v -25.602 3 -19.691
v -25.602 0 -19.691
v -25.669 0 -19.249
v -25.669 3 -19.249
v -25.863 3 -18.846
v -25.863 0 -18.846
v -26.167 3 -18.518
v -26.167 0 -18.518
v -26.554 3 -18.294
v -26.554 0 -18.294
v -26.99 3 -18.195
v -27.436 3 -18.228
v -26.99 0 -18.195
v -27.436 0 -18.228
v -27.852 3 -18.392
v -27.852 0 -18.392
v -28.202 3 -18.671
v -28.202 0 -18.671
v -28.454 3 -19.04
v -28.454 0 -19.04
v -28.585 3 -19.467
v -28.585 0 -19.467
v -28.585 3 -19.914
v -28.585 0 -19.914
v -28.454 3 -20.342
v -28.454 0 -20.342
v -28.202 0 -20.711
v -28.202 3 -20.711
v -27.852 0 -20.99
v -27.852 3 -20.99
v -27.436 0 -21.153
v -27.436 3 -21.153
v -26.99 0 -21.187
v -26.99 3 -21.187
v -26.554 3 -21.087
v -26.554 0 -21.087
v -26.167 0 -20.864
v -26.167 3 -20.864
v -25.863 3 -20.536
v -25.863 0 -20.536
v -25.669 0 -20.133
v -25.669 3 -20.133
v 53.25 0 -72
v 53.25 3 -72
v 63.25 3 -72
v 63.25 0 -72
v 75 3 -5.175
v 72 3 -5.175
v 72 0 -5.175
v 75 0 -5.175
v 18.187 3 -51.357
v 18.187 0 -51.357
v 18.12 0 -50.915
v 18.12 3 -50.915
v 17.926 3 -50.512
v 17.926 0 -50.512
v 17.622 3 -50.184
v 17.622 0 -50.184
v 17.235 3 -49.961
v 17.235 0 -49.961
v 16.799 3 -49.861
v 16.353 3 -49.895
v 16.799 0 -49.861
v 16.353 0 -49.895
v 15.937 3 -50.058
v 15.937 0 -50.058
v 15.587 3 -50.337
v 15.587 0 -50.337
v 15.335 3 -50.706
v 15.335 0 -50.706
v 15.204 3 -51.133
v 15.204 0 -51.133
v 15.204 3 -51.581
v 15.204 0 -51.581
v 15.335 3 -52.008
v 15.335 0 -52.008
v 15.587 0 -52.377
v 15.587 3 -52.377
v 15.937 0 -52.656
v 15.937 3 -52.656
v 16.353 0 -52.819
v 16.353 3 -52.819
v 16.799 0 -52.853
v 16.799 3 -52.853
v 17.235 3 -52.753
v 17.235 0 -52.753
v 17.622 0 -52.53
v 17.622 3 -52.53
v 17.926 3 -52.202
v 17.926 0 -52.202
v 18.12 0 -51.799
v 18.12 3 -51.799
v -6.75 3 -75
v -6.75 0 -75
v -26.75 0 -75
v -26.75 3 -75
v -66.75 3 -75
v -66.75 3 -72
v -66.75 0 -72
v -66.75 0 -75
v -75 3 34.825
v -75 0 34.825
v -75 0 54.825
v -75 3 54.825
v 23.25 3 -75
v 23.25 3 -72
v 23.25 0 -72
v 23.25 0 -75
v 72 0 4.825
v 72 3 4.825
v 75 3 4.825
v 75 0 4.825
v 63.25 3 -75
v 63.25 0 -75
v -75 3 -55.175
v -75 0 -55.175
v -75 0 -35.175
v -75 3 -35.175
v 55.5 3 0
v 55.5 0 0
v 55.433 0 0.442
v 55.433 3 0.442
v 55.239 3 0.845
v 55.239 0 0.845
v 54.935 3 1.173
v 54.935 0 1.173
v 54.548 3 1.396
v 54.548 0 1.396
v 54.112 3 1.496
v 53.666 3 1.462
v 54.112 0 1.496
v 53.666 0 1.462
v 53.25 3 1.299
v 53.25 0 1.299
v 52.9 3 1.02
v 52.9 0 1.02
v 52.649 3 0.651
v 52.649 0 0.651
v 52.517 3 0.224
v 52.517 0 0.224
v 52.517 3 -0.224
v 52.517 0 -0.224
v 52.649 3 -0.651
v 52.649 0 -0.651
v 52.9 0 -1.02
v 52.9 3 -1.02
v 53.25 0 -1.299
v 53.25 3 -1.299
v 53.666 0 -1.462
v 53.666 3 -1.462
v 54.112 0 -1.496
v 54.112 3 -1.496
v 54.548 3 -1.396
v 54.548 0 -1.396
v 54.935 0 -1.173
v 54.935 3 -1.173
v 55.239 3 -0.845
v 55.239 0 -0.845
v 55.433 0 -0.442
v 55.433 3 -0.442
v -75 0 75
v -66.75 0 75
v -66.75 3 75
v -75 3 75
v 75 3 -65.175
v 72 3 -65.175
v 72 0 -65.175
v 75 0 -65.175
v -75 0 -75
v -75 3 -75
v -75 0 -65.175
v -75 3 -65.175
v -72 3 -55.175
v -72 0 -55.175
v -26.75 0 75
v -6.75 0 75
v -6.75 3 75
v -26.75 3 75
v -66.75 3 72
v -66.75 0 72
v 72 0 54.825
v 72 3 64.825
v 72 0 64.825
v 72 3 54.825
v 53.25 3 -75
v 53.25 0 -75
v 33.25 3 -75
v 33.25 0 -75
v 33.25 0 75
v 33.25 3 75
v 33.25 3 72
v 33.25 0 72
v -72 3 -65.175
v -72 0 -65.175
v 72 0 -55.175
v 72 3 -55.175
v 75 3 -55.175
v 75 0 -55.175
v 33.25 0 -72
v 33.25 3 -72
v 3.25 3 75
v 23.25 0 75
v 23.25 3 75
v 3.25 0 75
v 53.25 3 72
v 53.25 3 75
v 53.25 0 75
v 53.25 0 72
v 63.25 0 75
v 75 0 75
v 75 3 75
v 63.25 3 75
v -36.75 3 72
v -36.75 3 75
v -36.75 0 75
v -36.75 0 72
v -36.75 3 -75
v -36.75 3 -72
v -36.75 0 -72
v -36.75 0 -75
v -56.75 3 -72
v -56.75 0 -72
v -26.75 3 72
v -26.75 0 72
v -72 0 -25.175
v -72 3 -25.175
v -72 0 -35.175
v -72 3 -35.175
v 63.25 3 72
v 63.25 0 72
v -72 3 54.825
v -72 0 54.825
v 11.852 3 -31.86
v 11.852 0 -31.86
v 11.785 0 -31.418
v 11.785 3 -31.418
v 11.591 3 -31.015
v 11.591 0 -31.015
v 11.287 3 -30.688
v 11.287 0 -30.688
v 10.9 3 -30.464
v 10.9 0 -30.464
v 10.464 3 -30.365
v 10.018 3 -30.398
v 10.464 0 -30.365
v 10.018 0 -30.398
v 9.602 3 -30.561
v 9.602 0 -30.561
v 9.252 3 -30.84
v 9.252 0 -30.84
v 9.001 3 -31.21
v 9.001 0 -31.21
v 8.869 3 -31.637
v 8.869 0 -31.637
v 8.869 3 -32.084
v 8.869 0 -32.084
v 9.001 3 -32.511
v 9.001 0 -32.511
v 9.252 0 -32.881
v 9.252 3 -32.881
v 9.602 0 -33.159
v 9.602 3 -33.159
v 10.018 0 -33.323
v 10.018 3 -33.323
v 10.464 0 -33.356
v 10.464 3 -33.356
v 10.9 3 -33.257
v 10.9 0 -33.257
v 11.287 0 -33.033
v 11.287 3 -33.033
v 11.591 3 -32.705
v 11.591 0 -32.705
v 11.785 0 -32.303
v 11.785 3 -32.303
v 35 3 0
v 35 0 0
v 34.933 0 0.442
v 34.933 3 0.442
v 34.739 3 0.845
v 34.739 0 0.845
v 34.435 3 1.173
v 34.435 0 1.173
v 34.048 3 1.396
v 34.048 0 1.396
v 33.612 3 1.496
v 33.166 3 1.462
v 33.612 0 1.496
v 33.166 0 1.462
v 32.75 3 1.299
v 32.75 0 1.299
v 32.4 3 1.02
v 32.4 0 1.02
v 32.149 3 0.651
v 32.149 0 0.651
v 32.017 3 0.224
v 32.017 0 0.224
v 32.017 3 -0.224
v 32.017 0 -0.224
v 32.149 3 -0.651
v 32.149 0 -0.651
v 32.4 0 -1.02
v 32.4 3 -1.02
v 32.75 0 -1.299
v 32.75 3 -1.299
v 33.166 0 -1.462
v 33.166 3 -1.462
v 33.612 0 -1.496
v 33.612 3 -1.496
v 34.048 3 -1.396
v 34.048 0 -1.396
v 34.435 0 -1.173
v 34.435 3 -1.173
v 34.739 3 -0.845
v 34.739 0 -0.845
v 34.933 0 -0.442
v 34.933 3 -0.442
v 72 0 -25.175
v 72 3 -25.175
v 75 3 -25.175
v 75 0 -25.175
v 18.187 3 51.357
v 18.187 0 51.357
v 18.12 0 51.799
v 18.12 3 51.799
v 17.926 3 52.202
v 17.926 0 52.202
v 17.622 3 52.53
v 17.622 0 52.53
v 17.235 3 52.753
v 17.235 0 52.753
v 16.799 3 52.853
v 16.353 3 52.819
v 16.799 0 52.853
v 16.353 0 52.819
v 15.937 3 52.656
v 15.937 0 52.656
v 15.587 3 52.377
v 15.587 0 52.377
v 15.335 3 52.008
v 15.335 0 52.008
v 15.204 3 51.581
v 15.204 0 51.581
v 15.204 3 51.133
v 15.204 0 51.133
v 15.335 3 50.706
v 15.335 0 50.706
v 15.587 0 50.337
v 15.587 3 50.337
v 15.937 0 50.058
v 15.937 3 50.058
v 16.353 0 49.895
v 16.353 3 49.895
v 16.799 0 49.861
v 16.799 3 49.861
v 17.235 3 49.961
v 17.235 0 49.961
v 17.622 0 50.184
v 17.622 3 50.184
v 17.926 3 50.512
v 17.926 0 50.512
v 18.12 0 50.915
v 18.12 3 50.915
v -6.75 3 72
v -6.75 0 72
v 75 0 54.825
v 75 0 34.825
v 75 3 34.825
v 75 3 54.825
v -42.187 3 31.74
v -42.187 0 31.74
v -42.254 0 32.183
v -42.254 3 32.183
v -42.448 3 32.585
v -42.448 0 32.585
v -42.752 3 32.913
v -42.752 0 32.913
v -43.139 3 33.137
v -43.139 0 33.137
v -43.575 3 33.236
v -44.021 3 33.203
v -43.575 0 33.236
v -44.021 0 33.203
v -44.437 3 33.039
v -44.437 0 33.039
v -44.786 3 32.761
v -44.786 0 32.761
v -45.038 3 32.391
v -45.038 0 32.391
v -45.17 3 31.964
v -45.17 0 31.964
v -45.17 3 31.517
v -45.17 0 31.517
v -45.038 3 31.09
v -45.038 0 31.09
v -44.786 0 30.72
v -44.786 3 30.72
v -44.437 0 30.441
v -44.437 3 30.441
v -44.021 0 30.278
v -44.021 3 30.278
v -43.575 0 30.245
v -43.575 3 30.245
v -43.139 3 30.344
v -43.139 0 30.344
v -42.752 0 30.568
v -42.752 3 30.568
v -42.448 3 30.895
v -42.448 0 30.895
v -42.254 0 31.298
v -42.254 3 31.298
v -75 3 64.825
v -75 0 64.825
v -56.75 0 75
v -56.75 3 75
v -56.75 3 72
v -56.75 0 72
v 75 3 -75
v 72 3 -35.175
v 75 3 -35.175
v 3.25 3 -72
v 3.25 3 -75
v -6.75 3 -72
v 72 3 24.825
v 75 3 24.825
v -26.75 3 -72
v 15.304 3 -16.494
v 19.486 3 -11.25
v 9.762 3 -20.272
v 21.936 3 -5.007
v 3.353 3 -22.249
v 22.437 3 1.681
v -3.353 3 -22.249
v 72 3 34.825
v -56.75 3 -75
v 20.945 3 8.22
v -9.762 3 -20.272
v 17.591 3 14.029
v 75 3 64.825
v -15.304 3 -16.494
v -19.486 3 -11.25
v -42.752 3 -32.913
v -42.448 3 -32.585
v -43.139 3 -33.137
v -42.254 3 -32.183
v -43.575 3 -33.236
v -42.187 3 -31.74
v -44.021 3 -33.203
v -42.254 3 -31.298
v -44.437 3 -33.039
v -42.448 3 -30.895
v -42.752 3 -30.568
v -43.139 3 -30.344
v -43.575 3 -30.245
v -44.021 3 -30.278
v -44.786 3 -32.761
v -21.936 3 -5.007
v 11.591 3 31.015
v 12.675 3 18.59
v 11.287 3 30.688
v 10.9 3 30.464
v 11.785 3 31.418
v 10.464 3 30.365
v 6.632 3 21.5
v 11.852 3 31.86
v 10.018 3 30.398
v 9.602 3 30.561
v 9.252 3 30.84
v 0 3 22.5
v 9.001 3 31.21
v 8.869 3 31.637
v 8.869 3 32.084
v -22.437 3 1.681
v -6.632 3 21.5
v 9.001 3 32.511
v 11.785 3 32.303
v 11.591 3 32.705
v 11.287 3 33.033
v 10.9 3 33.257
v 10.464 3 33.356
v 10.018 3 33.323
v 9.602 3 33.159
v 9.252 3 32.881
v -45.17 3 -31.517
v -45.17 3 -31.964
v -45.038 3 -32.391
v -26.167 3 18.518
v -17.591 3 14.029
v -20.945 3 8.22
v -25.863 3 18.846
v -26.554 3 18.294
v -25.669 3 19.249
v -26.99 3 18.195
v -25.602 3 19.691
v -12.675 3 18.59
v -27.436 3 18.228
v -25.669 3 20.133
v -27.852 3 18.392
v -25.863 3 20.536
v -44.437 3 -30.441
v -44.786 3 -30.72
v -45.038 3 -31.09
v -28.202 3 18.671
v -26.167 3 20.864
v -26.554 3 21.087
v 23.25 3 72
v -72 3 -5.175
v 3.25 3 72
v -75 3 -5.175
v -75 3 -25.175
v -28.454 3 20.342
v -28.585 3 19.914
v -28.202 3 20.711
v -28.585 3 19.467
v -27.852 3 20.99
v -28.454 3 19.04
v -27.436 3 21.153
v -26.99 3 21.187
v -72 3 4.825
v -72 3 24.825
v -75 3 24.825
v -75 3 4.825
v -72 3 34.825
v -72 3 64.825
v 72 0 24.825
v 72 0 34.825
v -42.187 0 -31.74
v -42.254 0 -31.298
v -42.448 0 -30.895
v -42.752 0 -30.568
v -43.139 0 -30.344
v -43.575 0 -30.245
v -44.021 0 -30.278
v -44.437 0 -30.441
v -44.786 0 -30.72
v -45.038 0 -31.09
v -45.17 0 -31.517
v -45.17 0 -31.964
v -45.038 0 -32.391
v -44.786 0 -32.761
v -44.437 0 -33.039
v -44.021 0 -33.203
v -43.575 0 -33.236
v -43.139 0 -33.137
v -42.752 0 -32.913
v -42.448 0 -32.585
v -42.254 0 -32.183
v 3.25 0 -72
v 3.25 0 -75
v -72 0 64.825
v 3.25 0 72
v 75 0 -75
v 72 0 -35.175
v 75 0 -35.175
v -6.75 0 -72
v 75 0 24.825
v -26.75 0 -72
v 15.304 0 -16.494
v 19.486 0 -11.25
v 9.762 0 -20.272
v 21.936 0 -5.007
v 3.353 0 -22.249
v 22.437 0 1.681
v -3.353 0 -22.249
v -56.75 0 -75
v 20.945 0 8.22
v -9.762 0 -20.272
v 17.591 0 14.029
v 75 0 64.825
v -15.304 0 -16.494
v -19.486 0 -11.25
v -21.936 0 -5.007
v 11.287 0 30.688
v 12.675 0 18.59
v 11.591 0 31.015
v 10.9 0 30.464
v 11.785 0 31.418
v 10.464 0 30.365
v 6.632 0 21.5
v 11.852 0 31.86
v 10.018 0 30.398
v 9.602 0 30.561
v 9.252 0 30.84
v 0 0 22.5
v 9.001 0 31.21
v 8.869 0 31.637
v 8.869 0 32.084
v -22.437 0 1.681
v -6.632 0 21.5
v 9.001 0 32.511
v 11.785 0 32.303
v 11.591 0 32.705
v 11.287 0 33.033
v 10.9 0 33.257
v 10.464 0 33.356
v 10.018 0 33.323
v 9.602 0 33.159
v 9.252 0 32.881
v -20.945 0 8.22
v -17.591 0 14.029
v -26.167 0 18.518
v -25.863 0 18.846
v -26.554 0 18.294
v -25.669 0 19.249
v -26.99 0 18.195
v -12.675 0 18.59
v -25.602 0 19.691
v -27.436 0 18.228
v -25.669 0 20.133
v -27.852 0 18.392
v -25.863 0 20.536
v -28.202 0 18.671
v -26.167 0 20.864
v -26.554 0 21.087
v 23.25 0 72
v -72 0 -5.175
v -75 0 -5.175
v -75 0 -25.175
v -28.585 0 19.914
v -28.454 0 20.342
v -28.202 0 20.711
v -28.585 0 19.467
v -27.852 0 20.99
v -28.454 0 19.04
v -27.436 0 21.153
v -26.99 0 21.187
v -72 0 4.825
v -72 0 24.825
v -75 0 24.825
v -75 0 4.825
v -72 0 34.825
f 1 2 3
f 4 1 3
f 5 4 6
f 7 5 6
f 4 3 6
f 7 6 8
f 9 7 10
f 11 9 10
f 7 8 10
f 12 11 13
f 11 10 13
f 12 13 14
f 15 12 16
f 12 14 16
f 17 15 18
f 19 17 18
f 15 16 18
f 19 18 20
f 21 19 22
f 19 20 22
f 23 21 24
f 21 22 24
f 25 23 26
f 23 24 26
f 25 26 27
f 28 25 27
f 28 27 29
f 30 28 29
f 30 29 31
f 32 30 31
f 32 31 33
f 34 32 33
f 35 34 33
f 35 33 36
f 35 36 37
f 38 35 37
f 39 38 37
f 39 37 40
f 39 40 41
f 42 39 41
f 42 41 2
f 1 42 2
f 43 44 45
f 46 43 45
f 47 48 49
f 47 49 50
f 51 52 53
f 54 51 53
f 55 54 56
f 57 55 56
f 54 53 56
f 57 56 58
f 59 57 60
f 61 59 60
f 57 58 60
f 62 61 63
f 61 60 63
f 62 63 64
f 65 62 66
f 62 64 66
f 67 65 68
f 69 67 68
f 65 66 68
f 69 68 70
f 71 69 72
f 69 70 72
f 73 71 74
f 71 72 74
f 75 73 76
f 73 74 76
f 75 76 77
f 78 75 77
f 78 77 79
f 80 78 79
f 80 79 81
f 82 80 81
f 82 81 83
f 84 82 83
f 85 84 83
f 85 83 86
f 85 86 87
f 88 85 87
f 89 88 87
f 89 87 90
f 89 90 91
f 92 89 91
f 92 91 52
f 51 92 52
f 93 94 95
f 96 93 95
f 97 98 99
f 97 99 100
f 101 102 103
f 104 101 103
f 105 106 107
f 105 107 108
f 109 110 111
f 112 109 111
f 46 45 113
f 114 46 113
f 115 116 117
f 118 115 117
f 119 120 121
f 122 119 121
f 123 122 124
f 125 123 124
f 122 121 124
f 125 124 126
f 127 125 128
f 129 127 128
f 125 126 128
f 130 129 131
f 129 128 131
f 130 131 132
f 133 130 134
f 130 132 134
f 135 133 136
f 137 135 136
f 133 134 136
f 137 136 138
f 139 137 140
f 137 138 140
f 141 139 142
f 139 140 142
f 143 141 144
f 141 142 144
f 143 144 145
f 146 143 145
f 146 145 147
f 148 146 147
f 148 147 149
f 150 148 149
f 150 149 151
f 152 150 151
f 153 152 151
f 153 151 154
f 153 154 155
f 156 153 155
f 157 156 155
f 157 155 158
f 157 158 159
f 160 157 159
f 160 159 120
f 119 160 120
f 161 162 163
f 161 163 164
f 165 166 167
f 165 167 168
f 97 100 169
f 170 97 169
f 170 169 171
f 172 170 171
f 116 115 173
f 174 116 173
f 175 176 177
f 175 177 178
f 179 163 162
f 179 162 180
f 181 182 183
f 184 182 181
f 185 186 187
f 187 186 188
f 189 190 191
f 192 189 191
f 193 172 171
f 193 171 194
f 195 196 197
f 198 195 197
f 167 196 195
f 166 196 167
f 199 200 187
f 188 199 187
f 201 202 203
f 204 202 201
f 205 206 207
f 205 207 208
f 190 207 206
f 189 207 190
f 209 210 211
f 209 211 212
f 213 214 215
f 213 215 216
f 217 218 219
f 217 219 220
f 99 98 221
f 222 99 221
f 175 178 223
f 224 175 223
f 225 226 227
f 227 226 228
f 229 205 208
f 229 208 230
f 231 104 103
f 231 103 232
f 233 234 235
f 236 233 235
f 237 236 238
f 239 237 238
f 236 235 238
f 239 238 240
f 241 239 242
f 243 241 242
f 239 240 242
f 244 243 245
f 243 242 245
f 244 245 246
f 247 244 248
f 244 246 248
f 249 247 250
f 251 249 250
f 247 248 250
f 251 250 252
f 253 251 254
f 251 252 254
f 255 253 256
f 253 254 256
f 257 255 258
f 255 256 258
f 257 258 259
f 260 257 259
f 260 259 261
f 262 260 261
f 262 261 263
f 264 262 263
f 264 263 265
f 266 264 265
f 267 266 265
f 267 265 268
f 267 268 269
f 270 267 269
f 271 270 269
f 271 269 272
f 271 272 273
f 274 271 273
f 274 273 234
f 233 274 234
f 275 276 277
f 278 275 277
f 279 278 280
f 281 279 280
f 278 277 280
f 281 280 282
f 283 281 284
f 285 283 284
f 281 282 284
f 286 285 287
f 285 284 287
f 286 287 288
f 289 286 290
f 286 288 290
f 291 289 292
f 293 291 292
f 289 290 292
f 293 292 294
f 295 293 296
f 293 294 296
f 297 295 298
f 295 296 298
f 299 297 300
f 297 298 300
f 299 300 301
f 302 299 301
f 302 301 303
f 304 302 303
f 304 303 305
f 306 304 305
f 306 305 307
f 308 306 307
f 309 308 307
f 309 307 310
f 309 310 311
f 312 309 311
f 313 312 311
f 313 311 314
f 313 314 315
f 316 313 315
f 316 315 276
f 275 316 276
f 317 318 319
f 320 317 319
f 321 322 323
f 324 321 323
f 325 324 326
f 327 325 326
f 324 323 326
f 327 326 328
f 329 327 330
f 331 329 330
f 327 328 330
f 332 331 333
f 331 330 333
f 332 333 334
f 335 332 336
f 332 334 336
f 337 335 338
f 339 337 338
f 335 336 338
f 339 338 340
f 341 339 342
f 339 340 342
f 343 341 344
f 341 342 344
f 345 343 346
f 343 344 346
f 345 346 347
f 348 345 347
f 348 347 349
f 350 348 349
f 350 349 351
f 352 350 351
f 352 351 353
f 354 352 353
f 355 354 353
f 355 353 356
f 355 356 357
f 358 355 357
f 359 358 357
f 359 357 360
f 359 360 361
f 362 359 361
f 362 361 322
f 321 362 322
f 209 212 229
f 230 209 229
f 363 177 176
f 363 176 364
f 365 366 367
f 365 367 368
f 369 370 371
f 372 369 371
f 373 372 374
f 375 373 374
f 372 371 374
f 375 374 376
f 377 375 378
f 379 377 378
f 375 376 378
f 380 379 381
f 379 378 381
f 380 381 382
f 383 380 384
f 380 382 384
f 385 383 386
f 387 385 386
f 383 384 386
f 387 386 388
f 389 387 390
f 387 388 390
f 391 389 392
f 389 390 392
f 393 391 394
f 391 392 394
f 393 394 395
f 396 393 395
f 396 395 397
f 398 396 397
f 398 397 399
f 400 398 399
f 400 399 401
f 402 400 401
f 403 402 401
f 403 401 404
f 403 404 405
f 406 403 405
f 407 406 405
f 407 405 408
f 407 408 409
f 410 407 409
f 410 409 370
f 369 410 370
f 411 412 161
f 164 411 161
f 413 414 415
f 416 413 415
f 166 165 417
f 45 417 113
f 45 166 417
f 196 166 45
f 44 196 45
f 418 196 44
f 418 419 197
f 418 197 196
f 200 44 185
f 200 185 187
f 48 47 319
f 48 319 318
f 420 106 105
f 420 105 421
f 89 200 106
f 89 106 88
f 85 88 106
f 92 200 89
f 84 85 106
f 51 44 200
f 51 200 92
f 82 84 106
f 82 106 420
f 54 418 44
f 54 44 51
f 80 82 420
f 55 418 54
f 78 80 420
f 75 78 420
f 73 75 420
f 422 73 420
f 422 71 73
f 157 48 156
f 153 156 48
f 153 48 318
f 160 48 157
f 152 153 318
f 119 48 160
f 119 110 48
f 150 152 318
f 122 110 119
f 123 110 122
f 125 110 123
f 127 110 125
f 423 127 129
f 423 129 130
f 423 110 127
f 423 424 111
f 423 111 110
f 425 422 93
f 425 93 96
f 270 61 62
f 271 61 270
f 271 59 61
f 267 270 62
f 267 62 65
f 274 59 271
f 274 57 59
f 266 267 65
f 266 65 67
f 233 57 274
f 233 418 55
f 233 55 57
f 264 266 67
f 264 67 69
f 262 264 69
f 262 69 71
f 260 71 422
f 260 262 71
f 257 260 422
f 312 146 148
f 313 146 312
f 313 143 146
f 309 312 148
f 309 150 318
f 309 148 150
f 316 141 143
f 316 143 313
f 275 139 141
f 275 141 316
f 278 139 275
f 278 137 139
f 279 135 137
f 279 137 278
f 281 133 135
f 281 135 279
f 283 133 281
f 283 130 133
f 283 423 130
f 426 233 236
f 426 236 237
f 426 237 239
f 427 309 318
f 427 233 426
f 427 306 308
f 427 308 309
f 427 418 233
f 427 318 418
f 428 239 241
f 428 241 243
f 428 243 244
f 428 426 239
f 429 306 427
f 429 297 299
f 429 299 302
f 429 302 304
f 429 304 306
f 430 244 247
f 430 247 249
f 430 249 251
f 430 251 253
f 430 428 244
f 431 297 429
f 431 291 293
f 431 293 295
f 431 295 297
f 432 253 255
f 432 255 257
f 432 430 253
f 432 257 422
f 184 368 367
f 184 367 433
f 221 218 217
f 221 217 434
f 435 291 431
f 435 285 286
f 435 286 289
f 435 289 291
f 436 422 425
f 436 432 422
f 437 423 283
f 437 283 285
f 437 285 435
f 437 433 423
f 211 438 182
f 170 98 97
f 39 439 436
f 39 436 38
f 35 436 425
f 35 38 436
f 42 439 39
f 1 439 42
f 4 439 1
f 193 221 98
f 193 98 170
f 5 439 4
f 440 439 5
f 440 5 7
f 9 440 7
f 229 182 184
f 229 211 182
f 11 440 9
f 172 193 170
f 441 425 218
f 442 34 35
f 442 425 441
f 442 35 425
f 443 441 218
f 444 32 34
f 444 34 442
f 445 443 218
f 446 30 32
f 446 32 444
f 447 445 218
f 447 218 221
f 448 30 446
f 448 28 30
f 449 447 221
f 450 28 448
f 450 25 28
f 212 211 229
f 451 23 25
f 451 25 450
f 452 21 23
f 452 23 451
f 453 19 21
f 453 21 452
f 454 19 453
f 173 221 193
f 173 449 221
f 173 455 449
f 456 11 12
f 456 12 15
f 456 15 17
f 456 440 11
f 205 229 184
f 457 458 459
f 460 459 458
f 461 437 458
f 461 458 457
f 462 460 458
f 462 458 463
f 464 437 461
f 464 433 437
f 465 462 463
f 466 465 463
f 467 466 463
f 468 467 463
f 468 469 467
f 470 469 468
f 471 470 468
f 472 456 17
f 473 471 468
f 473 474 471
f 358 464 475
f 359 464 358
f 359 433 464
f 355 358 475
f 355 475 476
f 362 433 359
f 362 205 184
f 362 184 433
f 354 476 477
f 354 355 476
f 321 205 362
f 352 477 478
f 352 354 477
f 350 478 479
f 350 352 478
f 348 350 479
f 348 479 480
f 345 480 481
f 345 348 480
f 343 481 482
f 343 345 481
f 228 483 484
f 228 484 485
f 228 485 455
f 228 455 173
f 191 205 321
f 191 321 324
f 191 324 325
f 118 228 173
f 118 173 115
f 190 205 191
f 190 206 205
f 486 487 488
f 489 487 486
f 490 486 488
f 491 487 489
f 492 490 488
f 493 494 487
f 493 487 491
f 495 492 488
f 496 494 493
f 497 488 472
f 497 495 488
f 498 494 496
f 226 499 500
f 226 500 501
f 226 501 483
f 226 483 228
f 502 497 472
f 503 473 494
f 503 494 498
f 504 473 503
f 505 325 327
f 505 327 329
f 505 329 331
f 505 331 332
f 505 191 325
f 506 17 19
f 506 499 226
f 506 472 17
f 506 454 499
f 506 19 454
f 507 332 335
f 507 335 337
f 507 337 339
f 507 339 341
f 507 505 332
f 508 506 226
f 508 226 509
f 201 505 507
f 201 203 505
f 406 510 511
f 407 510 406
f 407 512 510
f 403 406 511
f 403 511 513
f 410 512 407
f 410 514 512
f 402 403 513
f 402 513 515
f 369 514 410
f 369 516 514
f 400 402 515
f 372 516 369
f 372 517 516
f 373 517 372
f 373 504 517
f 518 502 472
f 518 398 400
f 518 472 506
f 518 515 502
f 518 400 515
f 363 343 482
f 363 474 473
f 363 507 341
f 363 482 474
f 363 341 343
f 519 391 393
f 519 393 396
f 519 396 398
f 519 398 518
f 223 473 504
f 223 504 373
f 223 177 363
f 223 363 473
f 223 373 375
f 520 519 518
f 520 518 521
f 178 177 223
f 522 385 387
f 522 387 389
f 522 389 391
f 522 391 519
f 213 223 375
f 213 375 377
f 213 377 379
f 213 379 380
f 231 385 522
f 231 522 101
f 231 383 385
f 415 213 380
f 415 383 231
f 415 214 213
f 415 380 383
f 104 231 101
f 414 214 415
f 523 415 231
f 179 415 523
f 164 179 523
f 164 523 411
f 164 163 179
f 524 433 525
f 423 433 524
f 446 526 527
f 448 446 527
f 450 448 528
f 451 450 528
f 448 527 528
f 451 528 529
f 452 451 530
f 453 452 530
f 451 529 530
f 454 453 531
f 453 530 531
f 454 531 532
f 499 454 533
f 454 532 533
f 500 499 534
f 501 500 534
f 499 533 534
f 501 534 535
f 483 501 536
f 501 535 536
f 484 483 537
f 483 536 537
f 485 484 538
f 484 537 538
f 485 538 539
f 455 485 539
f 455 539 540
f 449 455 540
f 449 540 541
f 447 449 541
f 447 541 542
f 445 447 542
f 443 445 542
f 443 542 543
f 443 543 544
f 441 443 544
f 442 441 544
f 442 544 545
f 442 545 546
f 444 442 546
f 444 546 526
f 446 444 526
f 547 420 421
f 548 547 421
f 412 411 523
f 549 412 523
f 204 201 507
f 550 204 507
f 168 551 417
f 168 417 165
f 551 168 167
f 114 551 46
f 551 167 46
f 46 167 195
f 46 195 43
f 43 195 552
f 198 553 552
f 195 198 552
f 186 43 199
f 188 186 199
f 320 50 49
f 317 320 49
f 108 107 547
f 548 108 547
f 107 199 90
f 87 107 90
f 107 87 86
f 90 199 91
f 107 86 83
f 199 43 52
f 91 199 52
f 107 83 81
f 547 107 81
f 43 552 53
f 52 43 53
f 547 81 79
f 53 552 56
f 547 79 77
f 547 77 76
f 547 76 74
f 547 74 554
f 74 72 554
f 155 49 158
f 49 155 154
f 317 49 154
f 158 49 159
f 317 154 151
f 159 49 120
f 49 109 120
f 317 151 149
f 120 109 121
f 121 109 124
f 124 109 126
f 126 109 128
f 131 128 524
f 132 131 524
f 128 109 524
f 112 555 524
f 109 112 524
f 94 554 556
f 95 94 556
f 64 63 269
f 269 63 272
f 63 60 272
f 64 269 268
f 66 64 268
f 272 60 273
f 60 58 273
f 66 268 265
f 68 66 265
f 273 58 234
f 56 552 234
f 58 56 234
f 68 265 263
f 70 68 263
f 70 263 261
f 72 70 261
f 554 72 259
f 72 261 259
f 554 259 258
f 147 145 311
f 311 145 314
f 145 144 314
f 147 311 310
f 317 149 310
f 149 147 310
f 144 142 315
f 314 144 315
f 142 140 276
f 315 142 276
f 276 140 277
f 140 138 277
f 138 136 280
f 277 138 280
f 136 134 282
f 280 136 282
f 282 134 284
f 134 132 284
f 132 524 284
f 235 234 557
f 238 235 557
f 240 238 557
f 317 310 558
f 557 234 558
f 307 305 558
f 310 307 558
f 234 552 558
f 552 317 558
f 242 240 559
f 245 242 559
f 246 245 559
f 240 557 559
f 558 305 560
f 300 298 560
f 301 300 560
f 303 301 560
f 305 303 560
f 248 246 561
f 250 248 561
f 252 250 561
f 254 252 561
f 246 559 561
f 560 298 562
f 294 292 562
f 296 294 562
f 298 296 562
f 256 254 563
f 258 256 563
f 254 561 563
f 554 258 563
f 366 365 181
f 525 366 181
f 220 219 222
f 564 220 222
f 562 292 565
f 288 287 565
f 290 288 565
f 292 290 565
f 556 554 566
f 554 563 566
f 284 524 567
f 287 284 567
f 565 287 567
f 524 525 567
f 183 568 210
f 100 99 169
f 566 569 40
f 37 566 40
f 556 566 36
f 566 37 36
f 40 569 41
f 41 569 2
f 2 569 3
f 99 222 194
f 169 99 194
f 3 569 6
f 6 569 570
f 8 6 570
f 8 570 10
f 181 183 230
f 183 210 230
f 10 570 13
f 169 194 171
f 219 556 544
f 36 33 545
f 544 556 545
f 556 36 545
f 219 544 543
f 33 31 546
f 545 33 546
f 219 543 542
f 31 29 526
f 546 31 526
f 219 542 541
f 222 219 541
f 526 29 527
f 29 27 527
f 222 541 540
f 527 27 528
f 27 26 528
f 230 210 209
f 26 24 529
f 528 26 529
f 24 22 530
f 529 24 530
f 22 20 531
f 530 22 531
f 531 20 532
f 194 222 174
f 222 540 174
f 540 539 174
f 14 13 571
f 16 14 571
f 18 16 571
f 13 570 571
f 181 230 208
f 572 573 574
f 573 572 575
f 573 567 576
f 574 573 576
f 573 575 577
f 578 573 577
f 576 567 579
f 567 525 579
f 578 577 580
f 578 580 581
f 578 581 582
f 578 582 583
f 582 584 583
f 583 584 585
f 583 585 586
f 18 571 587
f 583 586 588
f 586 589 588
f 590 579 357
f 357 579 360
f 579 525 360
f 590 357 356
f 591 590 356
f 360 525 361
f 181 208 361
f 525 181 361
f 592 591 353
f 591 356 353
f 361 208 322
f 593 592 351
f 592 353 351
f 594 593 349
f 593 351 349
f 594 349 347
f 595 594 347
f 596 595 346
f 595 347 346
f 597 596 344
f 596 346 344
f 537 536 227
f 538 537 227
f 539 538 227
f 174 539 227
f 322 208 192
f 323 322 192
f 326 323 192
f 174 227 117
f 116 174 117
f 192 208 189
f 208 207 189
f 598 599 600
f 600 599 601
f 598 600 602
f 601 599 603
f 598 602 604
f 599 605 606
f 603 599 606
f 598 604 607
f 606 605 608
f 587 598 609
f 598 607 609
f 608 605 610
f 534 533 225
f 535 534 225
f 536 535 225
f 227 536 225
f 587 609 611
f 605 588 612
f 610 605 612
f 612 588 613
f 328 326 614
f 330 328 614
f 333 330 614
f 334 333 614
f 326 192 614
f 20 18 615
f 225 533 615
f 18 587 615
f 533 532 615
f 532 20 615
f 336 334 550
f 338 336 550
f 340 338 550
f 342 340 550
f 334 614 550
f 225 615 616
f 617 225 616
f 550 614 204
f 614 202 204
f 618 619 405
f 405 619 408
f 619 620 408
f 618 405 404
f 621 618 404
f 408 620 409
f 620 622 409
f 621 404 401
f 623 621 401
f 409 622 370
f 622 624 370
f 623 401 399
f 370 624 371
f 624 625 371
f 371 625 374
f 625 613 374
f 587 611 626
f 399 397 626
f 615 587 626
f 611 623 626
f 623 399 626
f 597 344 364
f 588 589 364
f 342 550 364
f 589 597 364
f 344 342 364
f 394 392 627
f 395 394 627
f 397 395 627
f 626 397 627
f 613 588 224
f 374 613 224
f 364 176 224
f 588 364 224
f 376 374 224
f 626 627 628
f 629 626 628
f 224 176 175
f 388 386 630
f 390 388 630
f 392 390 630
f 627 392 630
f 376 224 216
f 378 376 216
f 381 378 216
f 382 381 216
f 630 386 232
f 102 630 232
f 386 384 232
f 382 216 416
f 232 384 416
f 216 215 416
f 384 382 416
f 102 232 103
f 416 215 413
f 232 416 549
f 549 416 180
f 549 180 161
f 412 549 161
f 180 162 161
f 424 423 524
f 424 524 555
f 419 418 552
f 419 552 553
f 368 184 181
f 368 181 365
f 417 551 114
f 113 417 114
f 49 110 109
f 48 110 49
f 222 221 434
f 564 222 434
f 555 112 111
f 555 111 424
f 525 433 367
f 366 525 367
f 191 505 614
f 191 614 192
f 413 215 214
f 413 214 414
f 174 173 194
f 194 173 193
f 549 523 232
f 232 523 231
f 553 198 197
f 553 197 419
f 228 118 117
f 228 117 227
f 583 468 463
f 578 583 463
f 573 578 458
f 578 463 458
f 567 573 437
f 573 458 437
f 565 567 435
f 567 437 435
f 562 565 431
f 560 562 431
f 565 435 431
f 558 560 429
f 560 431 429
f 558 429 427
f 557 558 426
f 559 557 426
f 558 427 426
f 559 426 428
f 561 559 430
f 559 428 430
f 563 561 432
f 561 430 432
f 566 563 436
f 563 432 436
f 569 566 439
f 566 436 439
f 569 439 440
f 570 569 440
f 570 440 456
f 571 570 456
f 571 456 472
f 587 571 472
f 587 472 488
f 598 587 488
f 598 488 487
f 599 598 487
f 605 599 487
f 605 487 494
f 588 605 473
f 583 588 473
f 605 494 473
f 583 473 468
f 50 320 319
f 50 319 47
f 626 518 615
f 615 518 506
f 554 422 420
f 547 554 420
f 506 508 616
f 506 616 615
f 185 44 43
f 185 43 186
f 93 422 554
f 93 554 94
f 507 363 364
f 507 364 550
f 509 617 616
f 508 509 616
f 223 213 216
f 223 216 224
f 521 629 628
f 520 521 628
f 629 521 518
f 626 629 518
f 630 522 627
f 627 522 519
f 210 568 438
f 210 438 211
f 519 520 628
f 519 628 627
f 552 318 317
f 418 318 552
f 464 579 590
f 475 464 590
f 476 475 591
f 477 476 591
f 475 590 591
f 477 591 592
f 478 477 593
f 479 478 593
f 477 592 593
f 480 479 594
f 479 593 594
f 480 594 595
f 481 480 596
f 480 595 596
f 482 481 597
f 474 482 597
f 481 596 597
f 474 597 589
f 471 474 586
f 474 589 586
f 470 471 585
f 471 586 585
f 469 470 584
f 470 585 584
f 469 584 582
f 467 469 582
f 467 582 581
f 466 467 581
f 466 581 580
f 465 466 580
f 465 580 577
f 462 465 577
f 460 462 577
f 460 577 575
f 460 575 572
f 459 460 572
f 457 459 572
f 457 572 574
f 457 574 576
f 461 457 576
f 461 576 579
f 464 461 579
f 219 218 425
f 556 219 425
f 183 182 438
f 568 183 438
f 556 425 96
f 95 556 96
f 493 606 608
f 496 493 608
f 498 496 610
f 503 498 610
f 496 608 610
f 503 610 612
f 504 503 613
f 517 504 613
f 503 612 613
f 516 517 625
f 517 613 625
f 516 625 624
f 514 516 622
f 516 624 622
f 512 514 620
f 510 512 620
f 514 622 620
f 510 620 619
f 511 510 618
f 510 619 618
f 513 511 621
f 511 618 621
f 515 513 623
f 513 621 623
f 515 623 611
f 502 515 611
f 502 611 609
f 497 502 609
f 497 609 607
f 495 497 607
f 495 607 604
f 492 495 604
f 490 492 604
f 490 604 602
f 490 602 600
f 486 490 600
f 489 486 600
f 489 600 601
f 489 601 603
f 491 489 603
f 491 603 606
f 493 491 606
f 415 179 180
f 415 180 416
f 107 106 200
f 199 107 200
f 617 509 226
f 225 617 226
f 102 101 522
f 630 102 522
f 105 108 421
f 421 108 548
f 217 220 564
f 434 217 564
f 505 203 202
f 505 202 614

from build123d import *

# Parameters (mm, degrees)
SKETCH1_W           = 150
SKETCH1_H           = 150
BOSS_EXTRUDE1_DEPTH = 3
SKETCH2_R           = 22.5
CUT_EXTRUDE1_DEPTH  = 3
SKETCH3_W           = 10
SKETCH3_H           = 3
CUT_EXTRUDE2_DEPTH  = 3
LPATTERN1_COUNT     = 5
LPATTERN1_PITCH     = 30
SKETCH4_W           = 3
SKETCH4_H           = 10
CUT_EXTRUDE3_DEPTH  = 3
LPATTERN2_COUNT     = 5
LPATTERN2_PITCH     = 30
SKETCH5_R           = 1.5
CUT_EXTRUDE4_DEPTH  = 10


with BuildPart() as part:
    # Sketch1 → Boss-Extrude1 (new body)
    with BuildSketch(Plane(origin=(0, 0, 0), x_dir=(-1, 0, 0), z_dir=(0, 1, 0))):
        Rectangle(SKETCH1_W, SKETCH1_H)
    extrude(amount=BOSS_EXTRUDE1_DEPTH)

    # Sketch2 → Cut-Extrude1 (cut)
    with BuildSketch(Plane(origin=(0, 3, 0), x_dir=(1, 0, 0), z_dir=(0, 1, 0))):
        with Locations(Location((0, 0, 0), (0, 0, 270))):
            Circle(SKETCH2_R)
    extrude(amount=-CUT_EXTRUDE1_DEPTH, mode=Mode.SUBTRACT)

    # Sketch3 → Cut-Extrude2 (cut)
    with BuildSketch(Plane(origin=(0, 3, 0), x_dir=(1, 0, 0), z_dir=(0, 1, 0))):
        with Locations((-61.749963879, 73.5)):
            Rectangle(SKETCH3_W, SKETCH3_H)
        with Locations((-61.749963879, -73.5)):
            Rectangle(SKETCH3_W, SKETCH3_H)
    cut_extrude2 = extrude(amount=-CUT_EXTRUDE2_DEPTH, mode=Mode.SUBTRACT)

    # LPattern1: Cut-Extrude2 ×5
    with Locations(*[(i * LPATTERN1_PITCH, 0, 0) for i in range(1, LPATTERN1_COUNT)]):
        add(cut_extrude2, mode=Mode.SUBTRACT)

    # Sketch4 → Cut-Extrude3 (cut)
    with BuildSketch(Plane(origin=(0, 3, 0), x_dir=(1, 0, 0), z_dir=(0, 1, 0))):
        with Locations((-73.5, -59.825317059)):
            Rectangle(SKETCH4_W, SKETCH4_H)
        with Locations((73.5, -59.825317059)):
            Rectangle(SKETCH4_W, SKETCH4_H)
    cut_extrude3 = extrude(amount=-CUT_EXTRUDE3_DEPTH, mode=Mode.SUBTRACT)

    # LPattern2: Cut-Extrude3 ×5
    with Locations(*[(0, 0, -i * LPATTERN2_PITCH) for i in range(1, LPATTERN2_COUNT)]):
        add(cut_extrude3, mode=Mode.SUBTRACT)

    # Sketch5 → Cut-Extrude4 (cut)
    with BuildSketch(Plane(origin=(0, 0, 0), x_dir=(-1, 0, 0), z_dir=(0, -1, 0))):
        with Locations(Location((-33.5, 0, 0), (0, 0, 180))):
            Circle(SKETCH5_R)
        with Locations(Location((-10.352069312, 31.860393296, 0), (0, 0, 180))):
            Circle(SKETCH5_R)
        with Locations(Location((27.102069312, 19.690805952, 0), (0, 0, 180))):
            Circle(SKETCH5_R)
        with Locations(Location((27.102069312, -19.690805952, 0), (0, 0, 180))):
            Circle(SKETCH5_R)
        with Locations(Location((-10.352069312, -31.860393296, 0), (0, 0, 180))):
            Circle(SKETCH5_R)
        with Locations(Location((-54, 0, 0), (0, 0, 180))):
            Circle(SKETCH5_R)
        with Locations(Location((-16.686917696, 51.35705188, 0), (0, 0, 180))):
            Circle(SKETCH5_R)
        with Locations(Location((43.686917696, 31.740403624, 0), (0, 0, 180))):
            Circle(SKETCH5_R)
        with Locations(Location((43.686917696, -31.740403624, 0), (0, 0, 180))):
            Circle(SKETCH5_R)
        with Locations(Location((-16.686917696, -51.35705188, 0), (0, 0, 180))):
            Circle(SKETCH5_R)
    extrude(amount=-CUT_EXTRUDE4_DEPTH, mode=Mode.SUBTRACT)


solid = part.part
